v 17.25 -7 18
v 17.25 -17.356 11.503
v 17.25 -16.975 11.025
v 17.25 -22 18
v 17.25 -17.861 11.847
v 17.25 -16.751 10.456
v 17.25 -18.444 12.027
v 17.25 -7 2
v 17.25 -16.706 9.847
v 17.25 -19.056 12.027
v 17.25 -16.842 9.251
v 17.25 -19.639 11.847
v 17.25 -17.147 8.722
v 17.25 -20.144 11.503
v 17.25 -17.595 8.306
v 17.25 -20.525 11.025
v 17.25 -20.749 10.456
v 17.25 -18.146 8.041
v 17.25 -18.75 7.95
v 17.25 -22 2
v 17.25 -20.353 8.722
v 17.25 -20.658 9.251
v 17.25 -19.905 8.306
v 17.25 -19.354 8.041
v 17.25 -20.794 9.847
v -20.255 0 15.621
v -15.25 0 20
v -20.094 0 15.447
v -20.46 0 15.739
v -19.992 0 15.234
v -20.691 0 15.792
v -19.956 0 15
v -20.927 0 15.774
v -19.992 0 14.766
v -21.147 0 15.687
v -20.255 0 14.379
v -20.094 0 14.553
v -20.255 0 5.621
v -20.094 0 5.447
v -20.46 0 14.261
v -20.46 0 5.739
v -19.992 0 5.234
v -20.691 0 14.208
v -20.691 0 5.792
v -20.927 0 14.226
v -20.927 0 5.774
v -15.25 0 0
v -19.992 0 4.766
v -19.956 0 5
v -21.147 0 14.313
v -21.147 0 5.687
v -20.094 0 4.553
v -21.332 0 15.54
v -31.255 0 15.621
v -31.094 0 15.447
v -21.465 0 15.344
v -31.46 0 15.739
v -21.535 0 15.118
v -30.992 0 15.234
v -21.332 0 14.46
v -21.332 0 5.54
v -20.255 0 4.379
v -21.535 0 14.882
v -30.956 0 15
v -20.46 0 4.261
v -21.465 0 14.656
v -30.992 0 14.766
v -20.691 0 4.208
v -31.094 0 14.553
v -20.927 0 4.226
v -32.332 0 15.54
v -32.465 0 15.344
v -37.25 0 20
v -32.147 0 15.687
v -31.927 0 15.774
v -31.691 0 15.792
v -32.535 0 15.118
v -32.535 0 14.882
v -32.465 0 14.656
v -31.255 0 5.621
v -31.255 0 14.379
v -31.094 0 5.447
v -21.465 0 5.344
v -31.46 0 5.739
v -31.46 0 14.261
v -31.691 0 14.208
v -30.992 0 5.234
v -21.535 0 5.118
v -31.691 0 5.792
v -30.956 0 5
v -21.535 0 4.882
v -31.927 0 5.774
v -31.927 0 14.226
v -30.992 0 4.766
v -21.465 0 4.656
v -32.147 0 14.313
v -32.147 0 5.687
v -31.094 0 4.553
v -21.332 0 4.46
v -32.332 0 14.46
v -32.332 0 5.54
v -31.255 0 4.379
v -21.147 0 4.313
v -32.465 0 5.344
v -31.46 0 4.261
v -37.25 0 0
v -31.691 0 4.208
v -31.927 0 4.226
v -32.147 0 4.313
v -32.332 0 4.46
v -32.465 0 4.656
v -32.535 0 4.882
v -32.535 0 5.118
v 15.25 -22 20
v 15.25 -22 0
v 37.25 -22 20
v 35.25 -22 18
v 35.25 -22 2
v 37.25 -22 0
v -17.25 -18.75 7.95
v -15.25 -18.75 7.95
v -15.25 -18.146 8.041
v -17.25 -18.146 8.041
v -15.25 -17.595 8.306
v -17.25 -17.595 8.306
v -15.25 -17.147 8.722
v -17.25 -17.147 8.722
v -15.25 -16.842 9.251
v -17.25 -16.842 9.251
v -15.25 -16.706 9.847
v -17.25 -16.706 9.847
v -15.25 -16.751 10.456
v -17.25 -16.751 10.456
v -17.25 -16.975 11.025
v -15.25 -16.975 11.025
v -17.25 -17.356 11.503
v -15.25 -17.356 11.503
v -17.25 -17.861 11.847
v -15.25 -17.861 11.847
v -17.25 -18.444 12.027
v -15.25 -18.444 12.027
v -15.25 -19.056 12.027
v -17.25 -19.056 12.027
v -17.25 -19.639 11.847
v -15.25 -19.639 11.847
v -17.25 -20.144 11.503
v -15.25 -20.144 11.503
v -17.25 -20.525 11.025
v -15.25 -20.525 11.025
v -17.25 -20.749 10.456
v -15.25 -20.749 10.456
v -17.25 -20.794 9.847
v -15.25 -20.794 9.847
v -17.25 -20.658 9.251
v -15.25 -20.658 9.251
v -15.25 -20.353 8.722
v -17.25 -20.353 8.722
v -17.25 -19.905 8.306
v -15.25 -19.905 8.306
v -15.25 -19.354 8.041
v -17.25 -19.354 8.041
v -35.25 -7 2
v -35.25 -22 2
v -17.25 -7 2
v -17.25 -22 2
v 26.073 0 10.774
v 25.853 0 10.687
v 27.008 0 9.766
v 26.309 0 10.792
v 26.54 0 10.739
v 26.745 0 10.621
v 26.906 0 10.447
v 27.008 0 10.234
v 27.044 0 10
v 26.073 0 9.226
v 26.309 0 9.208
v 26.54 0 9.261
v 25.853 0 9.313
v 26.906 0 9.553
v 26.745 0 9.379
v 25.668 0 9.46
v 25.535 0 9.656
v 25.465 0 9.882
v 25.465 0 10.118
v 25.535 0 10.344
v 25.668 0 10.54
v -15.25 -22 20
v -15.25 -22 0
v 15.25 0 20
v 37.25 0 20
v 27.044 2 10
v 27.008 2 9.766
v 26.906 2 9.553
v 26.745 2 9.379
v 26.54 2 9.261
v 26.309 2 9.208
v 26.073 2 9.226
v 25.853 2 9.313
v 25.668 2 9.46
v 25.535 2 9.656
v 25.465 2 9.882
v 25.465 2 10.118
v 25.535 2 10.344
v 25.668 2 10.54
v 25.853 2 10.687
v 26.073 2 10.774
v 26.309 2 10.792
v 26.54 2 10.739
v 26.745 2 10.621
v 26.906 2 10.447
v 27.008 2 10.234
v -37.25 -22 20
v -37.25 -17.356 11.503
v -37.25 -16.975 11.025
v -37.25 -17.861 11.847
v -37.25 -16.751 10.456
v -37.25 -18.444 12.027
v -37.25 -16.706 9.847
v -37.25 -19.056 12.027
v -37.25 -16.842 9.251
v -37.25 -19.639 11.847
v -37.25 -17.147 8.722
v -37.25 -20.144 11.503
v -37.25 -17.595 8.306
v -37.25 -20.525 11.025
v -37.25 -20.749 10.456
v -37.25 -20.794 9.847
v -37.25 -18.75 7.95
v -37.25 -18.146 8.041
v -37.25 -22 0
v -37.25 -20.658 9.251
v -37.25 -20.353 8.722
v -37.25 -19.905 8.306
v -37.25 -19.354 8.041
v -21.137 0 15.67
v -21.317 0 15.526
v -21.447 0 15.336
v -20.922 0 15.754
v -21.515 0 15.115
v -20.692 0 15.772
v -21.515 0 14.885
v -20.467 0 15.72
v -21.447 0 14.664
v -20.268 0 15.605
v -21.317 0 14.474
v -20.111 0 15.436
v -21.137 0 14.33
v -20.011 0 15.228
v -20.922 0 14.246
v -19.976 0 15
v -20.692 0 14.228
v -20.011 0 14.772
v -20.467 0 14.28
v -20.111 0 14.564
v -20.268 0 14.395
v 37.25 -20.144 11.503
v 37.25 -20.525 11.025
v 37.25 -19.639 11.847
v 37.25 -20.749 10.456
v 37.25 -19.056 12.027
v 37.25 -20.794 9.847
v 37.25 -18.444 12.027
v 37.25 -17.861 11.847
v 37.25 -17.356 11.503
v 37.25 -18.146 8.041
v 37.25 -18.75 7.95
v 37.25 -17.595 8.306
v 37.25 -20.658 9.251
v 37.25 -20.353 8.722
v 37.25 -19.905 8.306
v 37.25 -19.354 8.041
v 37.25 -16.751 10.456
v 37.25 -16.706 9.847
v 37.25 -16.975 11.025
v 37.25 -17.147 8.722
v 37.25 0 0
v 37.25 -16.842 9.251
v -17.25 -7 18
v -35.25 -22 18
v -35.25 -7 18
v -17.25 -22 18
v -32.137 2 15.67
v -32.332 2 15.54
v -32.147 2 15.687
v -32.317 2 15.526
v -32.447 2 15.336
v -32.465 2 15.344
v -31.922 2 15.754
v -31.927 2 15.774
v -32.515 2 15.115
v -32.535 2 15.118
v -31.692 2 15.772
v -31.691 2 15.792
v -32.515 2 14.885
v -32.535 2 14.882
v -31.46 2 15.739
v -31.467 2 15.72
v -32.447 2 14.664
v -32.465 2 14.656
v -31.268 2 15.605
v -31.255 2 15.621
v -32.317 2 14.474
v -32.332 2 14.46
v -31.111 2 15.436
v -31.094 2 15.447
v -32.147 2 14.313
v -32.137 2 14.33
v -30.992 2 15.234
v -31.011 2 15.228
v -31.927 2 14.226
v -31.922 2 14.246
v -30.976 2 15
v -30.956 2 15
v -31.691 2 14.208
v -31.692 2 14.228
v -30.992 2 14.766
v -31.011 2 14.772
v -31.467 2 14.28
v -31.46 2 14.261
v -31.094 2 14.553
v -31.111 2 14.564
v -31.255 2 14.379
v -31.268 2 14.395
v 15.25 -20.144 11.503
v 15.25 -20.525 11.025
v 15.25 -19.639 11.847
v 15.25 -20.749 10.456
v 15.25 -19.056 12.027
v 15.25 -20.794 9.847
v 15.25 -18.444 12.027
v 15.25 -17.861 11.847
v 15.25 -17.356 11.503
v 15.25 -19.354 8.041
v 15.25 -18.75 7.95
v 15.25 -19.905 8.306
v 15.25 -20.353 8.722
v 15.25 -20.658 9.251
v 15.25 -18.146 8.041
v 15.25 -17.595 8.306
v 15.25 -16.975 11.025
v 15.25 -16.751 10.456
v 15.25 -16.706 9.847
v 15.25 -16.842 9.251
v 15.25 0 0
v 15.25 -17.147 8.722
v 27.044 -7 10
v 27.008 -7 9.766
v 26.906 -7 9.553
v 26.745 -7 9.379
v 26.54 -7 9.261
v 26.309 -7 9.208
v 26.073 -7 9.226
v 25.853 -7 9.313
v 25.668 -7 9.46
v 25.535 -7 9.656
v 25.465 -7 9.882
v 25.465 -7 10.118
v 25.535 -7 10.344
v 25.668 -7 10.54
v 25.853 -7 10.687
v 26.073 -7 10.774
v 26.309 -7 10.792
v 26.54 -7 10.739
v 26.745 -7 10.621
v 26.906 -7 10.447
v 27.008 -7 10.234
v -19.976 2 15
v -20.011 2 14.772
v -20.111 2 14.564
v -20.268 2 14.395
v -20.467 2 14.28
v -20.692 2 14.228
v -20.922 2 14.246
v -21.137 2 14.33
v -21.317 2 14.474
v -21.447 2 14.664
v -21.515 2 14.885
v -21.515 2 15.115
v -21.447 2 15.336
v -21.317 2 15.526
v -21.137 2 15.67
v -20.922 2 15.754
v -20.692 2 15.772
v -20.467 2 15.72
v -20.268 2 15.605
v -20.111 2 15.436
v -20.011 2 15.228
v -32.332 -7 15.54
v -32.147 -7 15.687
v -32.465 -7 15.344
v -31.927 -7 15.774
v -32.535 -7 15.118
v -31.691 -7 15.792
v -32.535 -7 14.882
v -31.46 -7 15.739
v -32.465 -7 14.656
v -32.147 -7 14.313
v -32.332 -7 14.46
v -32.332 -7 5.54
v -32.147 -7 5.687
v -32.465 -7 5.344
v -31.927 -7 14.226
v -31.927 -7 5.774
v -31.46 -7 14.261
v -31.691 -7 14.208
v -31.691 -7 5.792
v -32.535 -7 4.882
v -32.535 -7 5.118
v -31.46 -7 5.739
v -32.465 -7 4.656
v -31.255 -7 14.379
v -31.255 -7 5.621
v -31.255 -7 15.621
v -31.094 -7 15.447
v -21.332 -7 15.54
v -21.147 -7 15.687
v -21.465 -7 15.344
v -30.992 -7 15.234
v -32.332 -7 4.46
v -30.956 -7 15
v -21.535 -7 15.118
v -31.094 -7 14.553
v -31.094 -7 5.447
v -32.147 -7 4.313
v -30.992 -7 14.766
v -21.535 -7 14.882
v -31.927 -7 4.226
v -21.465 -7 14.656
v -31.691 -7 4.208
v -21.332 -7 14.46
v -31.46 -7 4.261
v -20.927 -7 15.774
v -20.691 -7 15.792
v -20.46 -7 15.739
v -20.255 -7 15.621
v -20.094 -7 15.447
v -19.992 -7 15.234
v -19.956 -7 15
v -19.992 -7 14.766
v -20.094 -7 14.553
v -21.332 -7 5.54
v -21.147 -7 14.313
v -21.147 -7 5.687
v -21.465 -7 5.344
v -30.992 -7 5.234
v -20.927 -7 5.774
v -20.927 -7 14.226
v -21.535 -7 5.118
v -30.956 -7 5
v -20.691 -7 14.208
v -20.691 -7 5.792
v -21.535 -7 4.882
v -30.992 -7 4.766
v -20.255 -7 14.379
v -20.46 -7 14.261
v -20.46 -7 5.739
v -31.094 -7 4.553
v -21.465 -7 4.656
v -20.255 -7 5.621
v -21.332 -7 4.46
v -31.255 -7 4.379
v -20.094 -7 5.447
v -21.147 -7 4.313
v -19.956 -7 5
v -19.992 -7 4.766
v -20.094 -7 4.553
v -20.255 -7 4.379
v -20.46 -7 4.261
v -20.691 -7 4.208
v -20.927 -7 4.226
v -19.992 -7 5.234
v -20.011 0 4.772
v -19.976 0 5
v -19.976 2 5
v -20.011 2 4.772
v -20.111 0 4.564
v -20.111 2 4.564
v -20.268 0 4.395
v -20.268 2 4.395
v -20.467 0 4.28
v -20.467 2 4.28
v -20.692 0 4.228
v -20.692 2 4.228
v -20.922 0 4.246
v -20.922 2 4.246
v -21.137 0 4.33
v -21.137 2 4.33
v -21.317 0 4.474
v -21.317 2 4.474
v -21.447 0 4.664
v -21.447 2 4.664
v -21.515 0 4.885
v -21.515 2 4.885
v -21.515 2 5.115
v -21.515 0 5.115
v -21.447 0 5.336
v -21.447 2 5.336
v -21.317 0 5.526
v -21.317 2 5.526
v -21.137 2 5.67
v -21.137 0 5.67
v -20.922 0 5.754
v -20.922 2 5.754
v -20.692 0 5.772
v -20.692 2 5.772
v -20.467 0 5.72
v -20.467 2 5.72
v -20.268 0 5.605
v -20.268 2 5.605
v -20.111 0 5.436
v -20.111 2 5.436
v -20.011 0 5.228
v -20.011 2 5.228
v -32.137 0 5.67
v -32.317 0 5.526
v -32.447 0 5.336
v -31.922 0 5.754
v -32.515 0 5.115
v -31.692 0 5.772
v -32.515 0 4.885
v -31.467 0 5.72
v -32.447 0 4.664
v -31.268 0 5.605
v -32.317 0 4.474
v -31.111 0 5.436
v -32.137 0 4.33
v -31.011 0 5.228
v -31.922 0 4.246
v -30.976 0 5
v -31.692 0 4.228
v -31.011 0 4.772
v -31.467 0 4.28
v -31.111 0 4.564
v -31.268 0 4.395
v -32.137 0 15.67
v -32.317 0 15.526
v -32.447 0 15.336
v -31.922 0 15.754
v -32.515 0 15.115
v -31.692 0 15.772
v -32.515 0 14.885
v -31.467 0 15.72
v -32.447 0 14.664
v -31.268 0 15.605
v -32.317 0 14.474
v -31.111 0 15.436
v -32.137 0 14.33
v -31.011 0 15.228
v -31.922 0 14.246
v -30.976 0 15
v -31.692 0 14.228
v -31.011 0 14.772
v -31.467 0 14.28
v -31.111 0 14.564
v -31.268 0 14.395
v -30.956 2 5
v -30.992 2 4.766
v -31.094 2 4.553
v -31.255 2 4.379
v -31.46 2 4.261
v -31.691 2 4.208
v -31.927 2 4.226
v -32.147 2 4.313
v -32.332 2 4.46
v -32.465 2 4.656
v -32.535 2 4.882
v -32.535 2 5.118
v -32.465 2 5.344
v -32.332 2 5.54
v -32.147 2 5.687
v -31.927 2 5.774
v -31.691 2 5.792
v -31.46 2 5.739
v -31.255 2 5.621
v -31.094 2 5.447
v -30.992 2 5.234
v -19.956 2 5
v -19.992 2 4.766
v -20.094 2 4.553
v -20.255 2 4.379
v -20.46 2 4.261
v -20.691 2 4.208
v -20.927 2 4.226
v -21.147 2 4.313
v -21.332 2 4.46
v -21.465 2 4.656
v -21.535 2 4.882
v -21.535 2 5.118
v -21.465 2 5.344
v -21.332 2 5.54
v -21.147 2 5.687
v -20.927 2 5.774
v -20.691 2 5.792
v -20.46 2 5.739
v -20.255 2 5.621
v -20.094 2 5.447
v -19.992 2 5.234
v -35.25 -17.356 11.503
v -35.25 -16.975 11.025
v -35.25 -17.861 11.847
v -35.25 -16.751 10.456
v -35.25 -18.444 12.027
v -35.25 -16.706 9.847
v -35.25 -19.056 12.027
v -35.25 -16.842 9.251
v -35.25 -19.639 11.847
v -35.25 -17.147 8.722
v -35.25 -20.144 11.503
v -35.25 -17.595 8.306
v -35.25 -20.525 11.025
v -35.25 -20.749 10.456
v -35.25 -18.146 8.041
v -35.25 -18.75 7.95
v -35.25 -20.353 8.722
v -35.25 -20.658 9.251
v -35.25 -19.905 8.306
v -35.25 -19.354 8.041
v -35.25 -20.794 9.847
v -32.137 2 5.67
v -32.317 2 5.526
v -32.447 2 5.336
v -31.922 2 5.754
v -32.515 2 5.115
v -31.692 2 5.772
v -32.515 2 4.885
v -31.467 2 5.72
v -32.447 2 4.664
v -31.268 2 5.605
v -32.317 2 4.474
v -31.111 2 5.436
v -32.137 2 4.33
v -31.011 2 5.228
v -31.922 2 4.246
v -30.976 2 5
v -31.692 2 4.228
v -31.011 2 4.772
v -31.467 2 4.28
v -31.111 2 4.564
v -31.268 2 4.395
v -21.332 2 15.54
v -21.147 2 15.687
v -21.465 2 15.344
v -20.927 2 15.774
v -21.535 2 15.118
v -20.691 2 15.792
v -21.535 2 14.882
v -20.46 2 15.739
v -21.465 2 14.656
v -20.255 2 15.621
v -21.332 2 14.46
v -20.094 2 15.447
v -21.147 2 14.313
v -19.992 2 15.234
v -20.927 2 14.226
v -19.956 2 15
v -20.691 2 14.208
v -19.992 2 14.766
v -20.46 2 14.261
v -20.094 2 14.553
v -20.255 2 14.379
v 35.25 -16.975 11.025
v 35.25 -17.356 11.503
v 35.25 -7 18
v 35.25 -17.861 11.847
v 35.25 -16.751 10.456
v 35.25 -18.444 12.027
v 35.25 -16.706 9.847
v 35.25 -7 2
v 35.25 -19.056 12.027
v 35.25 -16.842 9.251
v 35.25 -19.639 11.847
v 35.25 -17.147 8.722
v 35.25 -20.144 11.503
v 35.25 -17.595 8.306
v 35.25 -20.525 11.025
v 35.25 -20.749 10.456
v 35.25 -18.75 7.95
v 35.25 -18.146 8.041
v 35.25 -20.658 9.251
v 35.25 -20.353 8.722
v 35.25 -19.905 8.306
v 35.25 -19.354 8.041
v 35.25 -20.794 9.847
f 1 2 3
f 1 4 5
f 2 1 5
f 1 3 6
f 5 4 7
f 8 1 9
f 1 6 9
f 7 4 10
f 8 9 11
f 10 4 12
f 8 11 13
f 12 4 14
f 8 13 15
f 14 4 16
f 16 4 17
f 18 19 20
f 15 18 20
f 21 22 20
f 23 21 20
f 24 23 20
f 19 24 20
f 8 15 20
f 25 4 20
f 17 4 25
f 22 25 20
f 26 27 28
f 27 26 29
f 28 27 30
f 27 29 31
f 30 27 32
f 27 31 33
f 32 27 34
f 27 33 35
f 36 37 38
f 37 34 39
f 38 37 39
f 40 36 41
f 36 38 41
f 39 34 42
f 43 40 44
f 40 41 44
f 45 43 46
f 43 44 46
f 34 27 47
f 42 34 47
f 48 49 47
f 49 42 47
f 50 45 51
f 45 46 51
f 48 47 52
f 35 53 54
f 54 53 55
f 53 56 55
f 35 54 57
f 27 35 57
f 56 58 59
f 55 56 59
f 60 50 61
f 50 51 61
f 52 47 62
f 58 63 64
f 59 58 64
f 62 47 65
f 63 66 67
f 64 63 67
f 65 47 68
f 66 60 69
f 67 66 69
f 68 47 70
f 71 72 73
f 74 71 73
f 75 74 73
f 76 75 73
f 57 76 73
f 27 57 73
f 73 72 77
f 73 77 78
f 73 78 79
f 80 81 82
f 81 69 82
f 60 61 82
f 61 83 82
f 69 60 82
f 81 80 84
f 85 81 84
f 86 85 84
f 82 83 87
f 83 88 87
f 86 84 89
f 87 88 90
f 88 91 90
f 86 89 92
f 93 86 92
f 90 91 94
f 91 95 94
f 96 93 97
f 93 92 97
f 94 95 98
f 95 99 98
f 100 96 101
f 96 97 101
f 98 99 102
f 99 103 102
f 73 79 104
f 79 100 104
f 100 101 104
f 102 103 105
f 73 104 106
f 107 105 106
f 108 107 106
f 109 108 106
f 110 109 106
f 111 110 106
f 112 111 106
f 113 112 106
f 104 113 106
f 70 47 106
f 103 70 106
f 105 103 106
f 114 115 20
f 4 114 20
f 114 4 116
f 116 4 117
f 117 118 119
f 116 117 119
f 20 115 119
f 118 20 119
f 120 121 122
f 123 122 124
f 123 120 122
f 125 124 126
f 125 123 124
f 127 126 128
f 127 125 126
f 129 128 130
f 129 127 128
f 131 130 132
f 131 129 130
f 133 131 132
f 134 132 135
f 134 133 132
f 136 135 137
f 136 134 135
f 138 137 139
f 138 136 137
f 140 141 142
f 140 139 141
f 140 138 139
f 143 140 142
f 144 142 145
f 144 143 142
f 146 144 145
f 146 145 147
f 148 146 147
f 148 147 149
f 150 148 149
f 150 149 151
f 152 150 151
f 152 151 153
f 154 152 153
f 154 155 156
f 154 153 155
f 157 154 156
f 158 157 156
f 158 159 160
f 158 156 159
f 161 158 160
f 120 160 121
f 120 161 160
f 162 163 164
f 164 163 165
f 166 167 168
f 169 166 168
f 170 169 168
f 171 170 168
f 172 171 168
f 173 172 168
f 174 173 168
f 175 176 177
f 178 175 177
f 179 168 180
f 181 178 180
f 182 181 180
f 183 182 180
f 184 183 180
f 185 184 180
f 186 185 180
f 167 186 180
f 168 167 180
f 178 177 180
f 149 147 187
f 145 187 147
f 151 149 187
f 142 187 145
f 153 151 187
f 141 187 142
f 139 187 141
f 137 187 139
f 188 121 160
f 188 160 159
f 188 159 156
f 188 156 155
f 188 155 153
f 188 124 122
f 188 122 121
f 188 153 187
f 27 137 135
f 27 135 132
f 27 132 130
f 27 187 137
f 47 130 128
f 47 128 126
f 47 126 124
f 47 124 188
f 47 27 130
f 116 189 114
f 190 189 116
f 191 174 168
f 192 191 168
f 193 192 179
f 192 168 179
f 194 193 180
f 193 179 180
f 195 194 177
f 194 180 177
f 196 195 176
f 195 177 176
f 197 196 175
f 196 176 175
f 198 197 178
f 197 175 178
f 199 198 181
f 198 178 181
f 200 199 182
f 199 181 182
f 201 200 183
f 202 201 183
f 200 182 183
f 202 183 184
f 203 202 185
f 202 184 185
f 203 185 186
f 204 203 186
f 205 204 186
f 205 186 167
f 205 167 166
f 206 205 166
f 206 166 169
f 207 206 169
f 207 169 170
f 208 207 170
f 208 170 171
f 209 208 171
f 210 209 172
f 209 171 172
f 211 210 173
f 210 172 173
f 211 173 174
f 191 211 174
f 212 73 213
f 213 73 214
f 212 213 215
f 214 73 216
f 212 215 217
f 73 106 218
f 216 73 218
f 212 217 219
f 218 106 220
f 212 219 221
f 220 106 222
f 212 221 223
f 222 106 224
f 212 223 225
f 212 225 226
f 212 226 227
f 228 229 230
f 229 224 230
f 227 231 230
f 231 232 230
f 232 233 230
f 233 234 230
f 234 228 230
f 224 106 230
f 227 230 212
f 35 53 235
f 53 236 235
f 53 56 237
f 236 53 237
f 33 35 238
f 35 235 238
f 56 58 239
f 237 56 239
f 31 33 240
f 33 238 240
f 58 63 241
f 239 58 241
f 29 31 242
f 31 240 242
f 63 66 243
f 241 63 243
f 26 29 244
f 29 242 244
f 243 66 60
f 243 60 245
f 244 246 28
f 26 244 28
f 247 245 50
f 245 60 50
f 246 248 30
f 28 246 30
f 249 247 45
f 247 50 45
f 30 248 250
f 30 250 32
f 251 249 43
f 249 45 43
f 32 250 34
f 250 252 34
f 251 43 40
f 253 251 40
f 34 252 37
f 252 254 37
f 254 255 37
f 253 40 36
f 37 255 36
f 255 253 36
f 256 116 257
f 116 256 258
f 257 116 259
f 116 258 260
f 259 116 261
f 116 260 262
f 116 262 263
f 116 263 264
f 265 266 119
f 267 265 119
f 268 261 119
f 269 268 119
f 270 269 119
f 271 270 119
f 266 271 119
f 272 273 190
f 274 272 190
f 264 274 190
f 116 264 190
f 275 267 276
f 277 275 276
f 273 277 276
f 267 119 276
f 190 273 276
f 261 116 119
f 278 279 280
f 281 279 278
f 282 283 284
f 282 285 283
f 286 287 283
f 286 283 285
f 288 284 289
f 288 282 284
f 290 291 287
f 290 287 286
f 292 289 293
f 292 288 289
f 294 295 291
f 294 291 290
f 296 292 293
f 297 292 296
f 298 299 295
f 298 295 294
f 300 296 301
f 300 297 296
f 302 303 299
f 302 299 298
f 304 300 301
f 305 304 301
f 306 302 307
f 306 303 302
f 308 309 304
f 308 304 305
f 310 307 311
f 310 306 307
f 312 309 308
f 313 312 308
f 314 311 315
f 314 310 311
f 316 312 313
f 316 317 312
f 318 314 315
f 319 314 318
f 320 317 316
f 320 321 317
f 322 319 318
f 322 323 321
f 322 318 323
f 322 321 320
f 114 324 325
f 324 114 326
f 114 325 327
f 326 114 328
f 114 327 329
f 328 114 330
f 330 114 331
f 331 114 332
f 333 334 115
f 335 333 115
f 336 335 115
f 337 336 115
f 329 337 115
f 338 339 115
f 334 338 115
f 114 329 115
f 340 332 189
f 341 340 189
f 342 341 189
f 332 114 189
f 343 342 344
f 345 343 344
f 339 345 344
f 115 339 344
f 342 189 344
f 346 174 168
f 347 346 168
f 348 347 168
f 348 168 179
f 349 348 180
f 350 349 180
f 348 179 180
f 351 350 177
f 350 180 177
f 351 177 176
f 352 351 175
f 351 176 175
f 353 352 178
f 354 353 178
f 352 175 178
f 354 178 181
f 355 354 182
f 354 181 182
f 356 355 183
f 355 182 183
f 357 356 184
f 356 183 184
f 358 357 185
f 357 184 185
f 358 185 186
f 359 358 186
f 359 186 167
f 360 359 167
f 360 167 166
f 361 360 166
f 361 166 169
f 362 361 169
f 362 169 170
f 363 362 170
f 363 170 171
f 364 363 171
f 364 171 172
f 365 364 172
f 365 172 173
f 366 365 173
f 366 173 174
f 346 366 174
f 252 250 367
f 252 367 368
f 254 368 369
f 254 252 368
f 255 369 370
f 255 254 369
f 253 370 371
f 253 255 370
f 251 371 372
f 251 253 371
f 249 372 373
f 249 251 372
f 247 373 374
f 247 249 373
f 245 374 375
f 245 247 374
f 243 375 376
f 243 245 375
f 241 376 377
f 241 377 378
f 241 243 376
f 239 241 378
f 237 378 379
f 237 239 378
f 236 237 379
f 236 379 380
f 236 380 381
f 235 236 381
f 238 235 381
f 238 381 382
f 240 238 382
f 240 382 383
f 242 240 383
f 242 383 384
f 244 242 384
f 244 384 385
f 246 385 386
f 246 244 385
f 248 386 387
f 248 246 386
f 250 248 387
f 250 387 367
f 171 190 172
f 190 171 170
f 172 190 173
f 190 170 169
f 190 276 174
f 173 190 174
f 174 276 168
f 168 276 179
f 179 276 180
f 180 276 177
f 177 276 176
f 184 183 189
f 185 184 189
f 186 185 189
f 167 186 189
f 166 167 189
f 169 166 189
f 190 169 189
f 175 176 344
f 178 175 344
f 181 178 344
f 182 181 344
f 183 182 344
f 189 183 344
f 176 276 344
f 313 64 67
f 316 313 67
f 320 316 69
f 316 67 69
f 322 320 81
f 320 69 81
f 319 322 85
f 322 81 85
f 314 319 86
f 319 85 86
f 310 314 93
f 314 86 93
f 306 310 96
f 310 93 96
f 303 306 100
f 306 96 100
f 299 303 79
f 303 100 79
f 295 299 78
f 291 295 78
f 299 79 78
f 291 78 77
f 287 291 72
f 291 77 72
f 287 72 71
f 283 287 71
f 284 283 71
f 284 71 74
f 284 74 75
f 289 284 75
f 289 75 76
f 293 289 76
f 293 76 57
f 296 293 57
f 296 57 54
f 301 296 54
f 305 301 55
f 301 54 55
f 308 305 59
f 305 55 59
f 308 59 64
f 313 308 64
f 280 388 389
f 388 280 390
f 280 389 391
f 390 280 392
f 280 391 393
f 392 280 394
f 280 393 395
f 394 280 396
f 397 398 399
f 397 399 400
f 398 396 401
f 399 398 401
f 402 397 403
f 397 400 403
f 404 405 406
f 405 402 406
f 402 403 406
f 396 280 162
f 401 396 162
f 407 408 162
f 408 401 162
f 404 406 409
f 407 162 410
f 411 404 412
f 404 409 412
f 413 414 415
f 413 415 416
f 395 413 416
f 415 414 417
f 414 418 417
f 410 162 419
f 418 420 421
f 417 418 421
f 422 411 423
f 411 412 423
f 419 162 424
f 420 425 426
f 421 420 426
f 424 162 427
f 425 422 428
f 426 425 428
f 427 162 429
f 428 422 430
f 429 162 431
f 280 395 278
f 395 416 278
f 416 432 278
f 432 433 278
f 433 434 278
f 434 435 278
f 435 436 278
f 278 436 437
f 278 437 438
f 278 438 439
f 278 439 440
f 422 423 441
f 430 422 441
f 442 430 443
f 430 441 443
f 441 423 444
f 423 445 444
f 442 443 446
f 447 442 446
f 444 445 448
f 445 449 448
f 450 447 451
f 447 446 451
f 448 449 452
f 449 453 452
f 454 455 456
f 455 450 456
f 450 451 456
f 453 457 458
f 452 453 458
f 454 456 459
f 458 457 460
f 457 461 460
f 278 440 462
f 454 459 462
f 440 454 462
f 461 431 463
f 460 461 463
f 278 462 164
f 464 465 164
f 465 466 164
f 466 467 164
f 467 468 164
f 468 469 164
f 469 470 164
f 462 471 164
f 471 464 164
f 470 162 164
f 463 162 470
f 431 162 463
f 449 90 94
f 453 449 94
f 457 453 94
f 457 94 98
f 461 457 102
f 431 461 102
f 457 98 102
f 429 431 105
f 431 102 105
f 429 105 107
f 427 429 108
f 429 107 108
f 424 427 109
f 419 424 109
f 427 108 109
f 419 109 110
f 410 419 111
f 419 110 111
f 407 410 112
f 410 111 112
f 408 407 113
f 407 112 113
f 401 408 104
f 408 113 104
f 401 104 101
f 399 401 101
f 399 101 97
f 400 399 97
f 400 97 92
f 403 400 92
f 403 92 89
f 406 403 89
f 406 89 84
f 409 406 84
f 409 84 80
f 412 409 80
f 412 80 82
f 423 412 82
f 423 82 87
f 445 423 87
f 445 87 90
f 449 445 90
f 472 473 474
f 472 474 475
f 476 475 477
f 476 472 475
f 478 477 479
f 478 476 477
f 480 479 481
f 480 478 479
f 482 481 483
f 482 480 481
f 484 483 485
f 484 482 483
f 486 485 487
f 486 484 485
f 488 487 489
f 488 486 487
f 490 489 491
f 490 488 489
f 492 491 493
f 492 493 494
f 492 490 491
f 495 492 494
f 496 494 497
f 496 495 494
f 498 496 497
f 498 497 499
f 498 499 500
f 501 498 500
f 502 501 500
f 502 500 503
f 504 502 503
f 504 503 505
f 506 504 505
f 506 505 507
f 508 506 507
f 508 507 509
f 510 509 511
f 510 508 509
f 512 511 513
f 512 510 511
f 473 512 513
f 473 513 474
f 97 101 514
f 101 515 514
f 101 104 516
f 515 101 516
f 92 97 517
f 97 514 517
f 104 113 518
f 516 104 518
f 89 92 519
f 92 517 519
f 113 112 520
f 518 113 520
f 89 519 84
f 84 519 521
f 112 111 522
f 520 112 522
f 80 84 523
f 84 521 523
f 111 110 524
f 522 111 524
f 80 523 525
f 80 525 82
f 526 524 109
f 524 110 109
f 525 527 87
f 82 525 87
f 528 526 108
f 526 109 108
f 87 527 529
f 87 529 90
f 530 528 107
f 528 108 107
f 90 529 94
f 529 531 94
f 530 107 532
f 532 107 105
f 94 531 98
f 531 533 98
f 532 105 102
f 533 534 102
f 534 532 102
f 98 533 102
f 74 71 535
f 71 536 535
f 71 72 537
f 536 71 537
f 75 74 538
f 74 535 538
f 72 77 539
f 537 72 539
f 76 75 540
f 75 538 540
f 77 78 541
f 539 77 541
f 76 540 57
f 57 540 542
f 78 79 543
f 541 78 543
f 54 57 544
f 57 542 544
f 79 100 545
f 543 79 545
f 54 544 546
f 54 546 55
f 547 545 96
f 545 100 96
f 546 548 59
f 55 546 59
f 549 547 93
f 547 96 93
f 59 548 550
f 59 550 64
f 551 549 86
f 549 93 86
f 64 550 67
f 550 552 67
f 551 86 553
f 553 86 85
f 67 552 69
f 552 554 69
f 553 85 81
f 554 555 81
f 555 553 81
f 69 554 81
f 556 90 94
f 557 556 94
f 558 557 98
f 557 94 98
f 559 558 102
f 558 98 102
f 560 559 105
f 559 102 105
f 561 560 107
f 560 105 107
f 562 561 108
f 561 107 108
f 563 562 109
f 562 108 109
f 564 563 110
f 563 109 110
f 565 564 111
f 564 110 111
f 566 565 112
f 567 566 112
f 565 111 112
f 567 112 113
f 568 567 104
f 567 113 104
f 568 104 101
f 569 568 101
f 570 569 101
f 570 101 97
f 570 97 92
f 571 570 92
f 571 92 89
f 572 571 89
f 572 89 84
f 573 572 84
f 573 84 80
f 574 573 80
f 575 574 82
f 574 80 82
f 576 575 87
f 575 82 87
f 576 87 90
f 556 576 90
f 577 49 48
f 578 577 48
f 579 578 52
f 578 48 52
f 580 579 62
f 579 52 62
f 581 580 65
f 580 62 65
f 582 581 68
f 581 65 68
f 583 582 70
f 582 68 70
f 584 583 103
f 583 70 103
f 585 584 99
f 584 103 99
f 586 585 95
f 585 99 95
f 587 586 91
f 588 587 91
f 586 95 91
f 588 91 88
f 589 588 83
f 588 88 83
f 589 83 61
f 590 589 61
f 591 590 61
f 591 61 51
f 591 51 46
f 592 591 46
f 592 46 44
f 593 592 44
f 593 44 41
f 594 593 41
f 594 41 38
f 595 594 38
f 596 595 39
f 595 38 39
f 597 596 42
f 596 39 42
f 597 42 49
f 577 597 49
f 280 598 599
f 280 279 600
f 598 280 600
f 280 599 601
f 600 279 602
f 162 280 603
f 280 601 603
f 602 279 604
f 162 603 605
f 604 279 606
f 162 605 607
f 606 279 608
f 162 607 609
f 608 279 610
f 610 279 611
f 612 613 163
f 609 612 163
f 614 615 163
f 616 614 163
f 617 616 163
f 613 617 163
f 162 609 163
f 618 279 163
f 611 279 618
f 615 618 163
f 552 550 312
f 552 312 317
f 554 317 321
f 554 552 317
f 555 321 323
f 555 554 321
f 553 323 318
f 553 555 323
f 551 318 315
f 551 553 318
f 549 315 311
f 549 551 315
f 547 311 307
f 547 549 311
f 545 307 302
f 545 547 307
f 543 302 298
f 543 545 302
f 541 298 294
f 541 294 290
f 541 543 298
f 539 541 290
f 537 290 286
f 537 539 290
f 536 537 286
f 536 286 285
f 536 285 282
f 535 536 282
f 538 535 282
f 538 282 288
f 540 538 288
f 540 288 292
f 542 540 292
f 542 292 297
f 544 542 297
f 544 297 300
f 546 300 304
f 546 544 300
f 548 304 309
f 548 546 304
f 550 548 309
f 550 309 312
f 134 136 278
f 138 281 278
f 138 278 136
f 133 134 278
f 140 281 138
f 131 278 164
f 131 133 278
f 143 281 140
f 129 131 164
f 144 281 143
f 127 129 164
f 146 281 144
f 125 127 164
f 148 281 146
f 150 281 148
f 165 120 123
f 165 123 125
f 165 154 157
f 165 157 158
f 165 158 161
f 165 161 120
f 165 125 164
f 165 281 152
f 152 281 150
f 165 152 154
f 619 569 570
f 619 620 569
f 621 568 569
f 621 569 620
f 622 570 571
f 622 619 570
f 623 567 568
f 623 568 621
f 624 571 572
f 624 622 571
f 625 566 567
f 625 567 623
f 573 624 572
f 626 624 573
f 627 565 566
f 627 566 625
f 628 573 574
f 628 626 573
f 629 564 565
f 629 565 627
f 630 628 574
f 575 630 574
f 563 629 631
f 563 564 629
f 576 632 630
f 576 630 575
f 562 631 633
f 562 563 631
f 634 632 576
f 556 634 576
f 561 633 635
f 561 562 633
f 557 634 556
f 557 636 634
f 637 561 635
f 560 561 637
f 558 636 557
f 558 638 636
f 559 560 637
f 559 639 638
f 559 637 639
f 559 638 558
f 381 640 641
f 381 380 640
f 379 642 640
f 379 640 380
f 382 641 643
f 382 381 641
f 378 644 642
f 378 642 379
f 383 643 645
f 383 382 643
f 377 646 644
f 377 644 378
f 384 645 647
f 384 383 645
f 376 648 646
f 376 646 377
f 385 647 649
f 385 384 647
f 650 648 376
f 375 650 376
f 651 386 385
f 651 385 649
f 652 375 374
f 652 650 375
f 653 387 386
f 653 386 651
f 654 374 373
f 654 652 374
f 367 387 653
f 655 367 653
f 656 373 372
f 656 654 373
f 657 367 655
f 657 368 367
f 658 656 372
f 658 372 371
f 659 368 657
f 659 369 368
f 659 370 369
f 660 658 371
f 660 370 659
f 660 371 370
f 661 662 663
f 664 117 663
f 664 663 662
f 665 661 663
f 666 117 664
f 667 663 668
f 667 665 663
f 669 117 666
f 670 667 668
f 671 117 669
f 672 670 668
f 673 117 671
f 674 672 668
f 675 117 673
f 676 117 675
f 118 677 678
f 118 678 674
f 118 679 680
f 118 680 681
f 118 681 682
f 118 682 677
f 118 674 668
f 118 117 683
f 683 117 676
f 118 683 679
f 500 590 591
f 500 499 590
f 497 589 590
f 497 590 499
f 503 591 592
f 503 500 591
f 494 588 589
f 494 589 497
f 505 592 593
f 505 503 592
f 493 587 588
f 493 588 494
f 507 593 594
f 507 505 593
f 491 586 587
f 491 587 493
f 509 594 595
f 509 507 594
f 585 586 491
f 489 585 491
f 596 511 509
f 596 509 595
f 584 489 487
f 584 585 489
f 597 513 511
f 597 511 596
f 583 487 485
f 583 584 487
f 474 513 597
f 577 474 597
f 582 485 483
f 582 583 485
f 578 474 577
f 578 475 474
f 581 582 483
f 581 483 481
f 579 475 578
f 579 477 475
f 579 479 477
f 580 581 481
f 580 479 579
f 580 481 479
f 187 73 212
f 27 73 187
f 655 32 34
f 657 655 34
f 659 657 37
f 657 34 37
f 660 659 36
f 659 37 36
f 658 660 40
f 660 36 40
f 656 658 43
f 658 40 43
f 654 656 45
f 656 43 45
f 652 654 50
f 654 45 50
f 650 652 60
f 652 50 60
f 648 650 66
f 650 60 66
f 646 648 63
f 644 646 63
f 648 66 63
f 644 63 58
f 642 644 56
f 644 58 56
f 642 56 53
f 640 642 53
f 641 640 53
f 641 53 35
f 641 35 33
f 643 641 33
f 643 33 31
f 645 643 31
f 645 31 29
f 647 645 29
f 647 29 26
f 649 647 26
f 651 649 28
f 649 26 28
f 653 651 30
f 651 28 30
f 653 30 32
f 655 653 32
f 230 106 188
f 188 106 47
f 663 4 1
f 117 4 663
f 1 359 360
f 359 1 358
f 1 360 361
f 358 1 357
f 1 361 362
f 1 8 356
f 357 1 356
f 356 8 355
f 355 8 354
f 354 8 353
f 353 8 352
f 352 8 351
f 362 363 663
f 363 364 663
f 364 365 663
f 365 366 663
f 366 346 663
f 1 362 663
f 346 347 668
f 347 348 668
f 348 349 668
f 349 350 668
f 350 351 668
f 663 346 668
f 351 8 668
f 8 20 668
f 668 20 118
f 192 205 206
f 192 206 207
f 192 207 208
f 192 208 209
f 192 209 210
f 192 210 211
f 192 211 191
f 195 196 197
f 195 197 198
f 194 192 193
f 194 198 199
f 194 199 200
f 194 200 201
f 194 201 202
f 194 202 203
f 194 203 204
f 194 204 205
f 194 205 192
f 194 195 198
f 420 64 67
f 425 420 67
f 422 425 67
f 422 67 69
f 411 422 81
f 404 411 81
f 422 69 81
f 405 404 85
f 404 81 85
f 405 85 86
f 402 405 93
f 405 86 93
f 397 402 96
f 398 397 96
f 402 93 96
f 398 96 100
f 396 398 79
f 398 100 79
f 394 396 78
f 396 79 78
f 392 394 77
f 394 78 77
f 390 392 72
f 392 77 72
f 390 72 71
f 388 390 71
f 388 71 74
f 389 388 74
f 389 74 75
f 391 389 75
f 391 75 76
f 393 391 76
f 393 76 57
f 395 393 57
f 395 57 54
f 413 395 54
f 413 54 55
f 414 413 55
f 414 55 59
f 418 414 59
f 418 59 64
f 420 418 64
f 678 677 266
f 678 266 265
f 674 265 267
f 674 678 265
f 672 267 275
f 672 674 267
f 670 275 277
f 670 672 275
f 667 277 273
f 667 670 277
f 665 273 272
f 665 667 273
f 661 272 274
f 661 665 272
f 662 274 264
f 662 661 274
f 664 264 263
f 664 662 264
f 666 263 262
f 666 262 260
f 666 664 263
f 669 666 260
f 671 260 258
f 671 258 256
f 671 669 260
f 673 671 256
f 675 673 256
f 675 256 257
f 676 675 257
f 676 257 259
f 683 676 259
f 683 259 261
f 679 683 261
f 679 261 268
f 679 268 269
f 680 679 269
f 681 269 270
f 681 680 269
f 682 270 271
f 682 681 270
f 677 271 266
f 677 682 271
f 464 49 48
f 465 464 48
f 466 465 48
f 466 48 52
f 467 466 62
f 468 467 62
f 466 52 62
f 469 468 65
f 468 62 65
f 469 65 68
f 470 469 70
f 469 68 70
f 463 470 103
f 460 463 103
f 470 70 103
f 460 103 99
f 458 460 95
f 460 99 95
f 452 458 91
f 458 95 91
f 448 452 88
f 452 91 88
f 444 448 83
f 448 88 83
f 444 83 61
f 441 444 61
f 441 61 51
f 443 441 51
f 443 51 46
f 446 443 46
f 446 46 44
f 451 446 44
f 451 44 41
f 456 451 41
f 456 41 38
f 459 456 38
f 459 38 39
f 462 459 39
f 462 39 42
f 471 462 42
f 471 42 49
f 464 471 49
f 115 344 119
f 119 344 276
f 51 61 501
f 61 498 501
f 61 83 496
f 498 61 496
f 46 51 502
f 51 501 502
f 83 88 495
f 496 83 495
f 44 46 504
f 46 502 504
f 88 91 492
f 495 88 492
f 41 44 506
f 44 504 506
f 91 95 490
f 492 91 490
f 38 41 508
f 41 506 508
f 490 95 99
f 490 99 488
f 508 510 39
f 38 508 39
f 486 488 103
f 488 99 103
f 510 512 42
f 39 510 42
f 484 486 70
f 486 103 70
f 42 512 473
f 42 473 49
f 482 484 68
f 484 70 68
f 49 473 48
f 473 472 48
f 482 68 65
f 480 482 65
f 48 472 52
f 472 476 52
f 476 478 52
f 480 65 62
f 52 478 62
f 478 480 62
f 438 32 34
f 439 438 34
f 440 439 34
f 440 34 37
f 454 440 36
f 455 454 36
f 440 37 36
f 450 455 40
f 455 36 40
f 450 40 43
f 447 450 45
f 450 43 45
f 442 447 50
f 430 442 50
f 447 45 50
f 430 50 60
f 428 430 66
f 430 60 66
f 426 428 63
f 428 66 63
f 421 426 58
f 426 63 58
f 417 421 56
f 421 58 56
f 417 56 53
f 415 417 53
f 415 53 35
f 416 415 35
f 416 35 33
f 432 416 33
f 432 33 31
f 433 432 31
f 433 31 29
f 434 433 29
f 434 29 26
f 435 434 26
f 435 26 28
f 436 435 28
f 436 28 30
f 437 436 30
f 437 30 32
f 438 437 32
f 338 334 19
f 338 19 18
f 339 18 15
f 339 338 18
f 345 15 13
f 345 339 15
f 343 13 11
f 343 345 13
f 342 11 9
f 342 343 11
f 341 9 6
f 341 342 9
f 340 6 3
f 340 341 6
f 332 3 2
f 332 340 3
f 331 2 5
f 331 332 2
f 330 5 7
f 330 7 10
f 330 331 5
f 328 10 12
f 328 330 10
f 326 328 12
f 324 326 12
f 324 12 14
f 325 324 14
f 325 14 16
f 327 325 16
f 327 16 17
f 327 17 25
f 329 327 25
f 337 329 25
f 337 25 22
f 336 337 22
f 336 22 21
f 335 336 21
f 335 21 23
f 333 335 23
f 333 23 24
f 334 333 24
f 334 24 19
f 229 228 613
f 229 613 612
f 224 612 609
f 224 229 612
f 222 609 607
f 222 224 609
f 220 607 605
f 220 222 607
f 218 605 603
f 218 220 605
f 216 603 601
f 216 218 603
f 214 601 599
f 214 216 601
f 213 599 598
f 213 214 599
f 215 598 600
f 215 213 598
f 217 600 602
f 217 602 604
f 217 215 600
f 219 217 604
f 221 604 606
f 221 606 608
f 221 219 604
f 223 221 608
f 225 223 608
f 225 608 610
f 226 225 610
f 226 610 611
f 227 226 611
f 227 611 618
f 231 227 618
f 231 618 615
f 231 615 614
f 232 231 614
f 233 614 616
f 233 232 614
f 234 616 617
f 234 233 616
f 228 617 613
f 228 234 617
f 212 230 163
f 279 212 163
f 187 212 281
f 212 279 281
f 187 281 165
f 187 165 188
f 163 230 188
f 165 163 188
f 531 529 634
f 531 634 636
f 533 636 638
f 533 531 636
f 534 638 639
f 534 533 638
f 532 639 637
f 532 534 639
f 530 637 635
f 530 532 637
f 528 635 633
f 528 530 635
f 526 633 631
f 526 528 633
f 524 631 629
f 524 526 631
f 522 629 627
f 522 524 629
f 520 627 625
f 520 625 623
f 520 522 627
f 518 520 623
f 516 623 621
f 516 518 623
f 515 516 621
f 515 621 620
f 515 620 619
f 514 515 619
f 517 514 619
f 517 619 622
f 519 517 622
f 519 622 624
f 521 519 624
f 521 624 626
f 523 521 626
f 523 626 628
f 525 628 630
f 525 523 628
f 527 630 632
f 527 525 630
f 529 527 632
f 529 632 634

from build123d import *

# Parameters (mm, degrees)
BOSS_EXTRUDE1_DEPTH   = 20
CUT_EXTRUDE2_START    = -22
SKETCH3_W             = 18
SKETCH3_H             = 16
CUT_EXTRUDE2_DEPTH    = 15
SKETCH4_R             = 0.79375
CUT_EXTRUDE3_DEPTH    = 23
SKETCH5_R             = 0.79375
SKETCH5_R_2           = 0.77375
BOSS_EXTRUDE3_DEPTH   = 2
BOSS_EXTRUDE3_2_DEPTH = 2
BOSS_EXTRUDE3_3_DEPTH = 2
BOSS_EXTRUDE3_4_DEPTH = 2
BOSS_EXTRUDE3_5_DEPTH = 2
CUT_EXTRUDE6_START    = 35.25
SKETCH11_R            = 2.05
CUT_EXTRUDE6_DEPTH    = 2
CUT_EXTRUDE7_START    = -37.25
SKETCH11_2_R          = 2.05
CUT_EXTRUDE7_DEPTH    = 2
CUT_EXTRUDE8_START    = -17.25
SKETCH11_3_R          = 2.05
CUT_EXTRUDE8_DEPTH    = 34.5
SKETCH6_R             = 2.05
CUT_EXTRUDE9_DEPTH    = 23
SKETCH12_W            = 30.5
SKETCH12_H            = 20
CUT_EXTRUDE10_DEPTH   = 23


with BuildPart() as part:
    # Sketch1 → Boss-Extrude1 (new body)
    with BuildSketch(Plane.XY):
        Polygon((37.25, 0), (-37.25, 0), (-37.25, -22), (-15.25, -22), (-15.25, -5), (15.25, -5), (15.25, -22), (37.25, -22), align=None)
    extrude(amount=BOSS_EXTRUDE1_DEPTH)

    # Sketch3 → Cut-Extrude2 (cut)
    with BuildSketch(Plane(origin=(0, 0, 0), x_dir=(1, 0, 0), z_dir=(0, 1, 0)).offset(CUT_EXTRUDE2_START)):
        with Locations((-26.25, -10)):
            Rectangle(SKETCH3_W, SKETCH3_H)
        with Locations((26.25, -10)):
            Rectangle(SKETCH3_W, SKETCH3_H)
    extrude(amount=CUT_EXTRUDE2_DEPTH, mode=Mode.SUBTRACT)

    # Sketch4 → Cut-Extrude3 (cut, through all)
    with BuildSketch(Plane(origin=(0, 0, 0), x_dir=(1, 0, 0), z_dir=(0, 1, 0))):
        with Locations((-31.75, -5)):
            Circle(SKETCH4_R)
        with Locations((-20.75, -5)):
            Circle(SKETCH4_R)
        with Locations((-20.75, -15)):
            Circle(SKETCH4_R)
        with Locations((-31.75, -15)):
            Circle(SKETCH4_R)
        with Locations((26.25, -10)):
            Circle(SKETCH4_R)
    extrude(amount=-CUT_EXTRUDE3_DEPTH, mode=Mode.SUBTRACT)

    # Sketch11 → Cut-Extrude6 (cut)
    with BuildSketch(Plane(origin=(0, 0, 0), x_dir=(0, 0, -1), z_dir=(1, 0, 0)).offset(CUT_EXTRUDE6_START)):
        with Locations((-10, -18.75)):
            Circle(SKETCH11_R)
    extrude(amount=CUT_EXTRUDE6_DEPTH, mode=Mode.SUBTRACT)

    # Sketch11<2> → Cut-Extrude7 (cut)
    with BuildSketch(Plane(origin=(0, 0, 0), x_dir=(0, 0, -1), z_dir=(1, 0, 0)).offset(CUT_EXTRUDE7_START)):
        with Locations((-10, -18.75)):
            Circle(SKETCH11_2_R)
    extrude(amount=CUT_EXTRUDE7_DEPTH, mode=Mode.SUBTRACT)

    # Sketch11<3> → Cut-Extrude8 (cut)
    with BuildSketch(Plane(origin=(0, 0, 0), x_dir=(0, 0, -1), z_dir=(1, 0, 0)).offset(CUT_EXTRUDE8_START)):
        with Locations((-10, -18.75)):
            Circle(SKETCH11_3_R)
    extrude(amount=CUT_EXTRUDE8_DEPTH, mode=Mode.SUBTRACT)

    # Sketch6 → Cut-Extrude9 (cut, through all)
    with BuildSketch(Plane(origin=(0, 0, 0), x_dir=(1, 0, 0), z_dir=(0, 1, 0))):
        with Locations((0, -10)):
            Circle(SKETCH6_R)
    extrude(amount=-CUT_EXTRUDE9_DEPTH, mode=Mode.SUBTRACT)

    # Sketch12 → Cut-Extrude10 (cut, through all)
    with BuildSketch(Plane(origin=(0, 0, 0), x_dir=(1, 0, 0), z_dir=(0, 1, 0))):
        with Locations((0, -10)):
            Rectangle(SKETCH12_W, SKETCH12_H)
    extrude(amount=-CUT_EXTRUDE10_DEPTH, mode=Mode.SUBTRACT)


with BuildPart() as body_2:
    # Sketch5 → Boss-Extrude3 (new body)
    with BuildSketch(Plane(origin=(0, 0, 0), x_dir=(1, 0, 0), z_dir=(0, 1, 0))):
        with Locations((-31.75, -5)):
            Circle(SKETCH5_R)
        with Locations((-31.75, -5)):
            Circle(SKETCH5_R_2, mode=Mode.SUBTRACT)
    extrude(amount=BOSS_EXTRUDE3_DEPTH)


with BuildPart() as body_3:
    # Sketch5 → Boss-Extrude3 2 (new body)
    with BuildSketch(Plane(origin=(0, 0, 0), x_dir=(1, 0, 0), z_dir=(0, 1, 0))):
        with Locations((-20.75, -5)):
            Circle(SKETCH5_R)
        with Locations((-20.75, -5)):
            Circle(SKETCH5_R_2, mode=Mode.SUBTRACT)
    extrude(amount=BOSS_EXTRUDE3_2_DEPTH)


with BuildPart() as body_4:
    # Sketch5 → Boss-Extrude3 3 (new body)
    with BuildSketch(Plane(origin=(0, 0, 0), x_dir=(1, 0, 0), z_dir=(0, 1, 0))):
        with Locations((-20.75, -15)):
            Circle(SKETCH5_R)
        with Locations((-20.75, -15)):
            Circle(SKETCH5_R_2, mode=Mode.SUBTRACT)
    extrude(amount=BOSS_EXTRUDE3_3_DEPTH)


with BuildPart() as body_5:
    # Sketch5 → Boss-Extrude3 4 (new body)
    with BuildSketch(Plane(origin=(0, 0, 0), x_dir=(1, 0, 0), z_dir=(0, 1, 0))):
        with Locations((-31.75, -15)):
            Circle(SKETCH5_R)
        with Locations((-31.75, -15)):
            Circle(SKETCH5_R_2, mode=Mode.SUBTRACT)
    extrude(amount=BOSS_EXTRUDE3_4_DEPTH)


with BuildPart() as body_6:
    # Sketch5 → Boss-Extrude3 5 (new body)
    with BuildSketch(Plane(origin=(0, 0, 0), x_dir=(1, 0, 0), z_dir=(0, 1, 0))):
        with Locations((26.25, -10)):
            Circle(SKETCH5_R)
    extrude(amount=BOSS_EXTRUDE3_5_DEPTH)


solid = Compound([part.part, body_2.part, body_3.part, body_4.part, body_5.part, body_6.part])
